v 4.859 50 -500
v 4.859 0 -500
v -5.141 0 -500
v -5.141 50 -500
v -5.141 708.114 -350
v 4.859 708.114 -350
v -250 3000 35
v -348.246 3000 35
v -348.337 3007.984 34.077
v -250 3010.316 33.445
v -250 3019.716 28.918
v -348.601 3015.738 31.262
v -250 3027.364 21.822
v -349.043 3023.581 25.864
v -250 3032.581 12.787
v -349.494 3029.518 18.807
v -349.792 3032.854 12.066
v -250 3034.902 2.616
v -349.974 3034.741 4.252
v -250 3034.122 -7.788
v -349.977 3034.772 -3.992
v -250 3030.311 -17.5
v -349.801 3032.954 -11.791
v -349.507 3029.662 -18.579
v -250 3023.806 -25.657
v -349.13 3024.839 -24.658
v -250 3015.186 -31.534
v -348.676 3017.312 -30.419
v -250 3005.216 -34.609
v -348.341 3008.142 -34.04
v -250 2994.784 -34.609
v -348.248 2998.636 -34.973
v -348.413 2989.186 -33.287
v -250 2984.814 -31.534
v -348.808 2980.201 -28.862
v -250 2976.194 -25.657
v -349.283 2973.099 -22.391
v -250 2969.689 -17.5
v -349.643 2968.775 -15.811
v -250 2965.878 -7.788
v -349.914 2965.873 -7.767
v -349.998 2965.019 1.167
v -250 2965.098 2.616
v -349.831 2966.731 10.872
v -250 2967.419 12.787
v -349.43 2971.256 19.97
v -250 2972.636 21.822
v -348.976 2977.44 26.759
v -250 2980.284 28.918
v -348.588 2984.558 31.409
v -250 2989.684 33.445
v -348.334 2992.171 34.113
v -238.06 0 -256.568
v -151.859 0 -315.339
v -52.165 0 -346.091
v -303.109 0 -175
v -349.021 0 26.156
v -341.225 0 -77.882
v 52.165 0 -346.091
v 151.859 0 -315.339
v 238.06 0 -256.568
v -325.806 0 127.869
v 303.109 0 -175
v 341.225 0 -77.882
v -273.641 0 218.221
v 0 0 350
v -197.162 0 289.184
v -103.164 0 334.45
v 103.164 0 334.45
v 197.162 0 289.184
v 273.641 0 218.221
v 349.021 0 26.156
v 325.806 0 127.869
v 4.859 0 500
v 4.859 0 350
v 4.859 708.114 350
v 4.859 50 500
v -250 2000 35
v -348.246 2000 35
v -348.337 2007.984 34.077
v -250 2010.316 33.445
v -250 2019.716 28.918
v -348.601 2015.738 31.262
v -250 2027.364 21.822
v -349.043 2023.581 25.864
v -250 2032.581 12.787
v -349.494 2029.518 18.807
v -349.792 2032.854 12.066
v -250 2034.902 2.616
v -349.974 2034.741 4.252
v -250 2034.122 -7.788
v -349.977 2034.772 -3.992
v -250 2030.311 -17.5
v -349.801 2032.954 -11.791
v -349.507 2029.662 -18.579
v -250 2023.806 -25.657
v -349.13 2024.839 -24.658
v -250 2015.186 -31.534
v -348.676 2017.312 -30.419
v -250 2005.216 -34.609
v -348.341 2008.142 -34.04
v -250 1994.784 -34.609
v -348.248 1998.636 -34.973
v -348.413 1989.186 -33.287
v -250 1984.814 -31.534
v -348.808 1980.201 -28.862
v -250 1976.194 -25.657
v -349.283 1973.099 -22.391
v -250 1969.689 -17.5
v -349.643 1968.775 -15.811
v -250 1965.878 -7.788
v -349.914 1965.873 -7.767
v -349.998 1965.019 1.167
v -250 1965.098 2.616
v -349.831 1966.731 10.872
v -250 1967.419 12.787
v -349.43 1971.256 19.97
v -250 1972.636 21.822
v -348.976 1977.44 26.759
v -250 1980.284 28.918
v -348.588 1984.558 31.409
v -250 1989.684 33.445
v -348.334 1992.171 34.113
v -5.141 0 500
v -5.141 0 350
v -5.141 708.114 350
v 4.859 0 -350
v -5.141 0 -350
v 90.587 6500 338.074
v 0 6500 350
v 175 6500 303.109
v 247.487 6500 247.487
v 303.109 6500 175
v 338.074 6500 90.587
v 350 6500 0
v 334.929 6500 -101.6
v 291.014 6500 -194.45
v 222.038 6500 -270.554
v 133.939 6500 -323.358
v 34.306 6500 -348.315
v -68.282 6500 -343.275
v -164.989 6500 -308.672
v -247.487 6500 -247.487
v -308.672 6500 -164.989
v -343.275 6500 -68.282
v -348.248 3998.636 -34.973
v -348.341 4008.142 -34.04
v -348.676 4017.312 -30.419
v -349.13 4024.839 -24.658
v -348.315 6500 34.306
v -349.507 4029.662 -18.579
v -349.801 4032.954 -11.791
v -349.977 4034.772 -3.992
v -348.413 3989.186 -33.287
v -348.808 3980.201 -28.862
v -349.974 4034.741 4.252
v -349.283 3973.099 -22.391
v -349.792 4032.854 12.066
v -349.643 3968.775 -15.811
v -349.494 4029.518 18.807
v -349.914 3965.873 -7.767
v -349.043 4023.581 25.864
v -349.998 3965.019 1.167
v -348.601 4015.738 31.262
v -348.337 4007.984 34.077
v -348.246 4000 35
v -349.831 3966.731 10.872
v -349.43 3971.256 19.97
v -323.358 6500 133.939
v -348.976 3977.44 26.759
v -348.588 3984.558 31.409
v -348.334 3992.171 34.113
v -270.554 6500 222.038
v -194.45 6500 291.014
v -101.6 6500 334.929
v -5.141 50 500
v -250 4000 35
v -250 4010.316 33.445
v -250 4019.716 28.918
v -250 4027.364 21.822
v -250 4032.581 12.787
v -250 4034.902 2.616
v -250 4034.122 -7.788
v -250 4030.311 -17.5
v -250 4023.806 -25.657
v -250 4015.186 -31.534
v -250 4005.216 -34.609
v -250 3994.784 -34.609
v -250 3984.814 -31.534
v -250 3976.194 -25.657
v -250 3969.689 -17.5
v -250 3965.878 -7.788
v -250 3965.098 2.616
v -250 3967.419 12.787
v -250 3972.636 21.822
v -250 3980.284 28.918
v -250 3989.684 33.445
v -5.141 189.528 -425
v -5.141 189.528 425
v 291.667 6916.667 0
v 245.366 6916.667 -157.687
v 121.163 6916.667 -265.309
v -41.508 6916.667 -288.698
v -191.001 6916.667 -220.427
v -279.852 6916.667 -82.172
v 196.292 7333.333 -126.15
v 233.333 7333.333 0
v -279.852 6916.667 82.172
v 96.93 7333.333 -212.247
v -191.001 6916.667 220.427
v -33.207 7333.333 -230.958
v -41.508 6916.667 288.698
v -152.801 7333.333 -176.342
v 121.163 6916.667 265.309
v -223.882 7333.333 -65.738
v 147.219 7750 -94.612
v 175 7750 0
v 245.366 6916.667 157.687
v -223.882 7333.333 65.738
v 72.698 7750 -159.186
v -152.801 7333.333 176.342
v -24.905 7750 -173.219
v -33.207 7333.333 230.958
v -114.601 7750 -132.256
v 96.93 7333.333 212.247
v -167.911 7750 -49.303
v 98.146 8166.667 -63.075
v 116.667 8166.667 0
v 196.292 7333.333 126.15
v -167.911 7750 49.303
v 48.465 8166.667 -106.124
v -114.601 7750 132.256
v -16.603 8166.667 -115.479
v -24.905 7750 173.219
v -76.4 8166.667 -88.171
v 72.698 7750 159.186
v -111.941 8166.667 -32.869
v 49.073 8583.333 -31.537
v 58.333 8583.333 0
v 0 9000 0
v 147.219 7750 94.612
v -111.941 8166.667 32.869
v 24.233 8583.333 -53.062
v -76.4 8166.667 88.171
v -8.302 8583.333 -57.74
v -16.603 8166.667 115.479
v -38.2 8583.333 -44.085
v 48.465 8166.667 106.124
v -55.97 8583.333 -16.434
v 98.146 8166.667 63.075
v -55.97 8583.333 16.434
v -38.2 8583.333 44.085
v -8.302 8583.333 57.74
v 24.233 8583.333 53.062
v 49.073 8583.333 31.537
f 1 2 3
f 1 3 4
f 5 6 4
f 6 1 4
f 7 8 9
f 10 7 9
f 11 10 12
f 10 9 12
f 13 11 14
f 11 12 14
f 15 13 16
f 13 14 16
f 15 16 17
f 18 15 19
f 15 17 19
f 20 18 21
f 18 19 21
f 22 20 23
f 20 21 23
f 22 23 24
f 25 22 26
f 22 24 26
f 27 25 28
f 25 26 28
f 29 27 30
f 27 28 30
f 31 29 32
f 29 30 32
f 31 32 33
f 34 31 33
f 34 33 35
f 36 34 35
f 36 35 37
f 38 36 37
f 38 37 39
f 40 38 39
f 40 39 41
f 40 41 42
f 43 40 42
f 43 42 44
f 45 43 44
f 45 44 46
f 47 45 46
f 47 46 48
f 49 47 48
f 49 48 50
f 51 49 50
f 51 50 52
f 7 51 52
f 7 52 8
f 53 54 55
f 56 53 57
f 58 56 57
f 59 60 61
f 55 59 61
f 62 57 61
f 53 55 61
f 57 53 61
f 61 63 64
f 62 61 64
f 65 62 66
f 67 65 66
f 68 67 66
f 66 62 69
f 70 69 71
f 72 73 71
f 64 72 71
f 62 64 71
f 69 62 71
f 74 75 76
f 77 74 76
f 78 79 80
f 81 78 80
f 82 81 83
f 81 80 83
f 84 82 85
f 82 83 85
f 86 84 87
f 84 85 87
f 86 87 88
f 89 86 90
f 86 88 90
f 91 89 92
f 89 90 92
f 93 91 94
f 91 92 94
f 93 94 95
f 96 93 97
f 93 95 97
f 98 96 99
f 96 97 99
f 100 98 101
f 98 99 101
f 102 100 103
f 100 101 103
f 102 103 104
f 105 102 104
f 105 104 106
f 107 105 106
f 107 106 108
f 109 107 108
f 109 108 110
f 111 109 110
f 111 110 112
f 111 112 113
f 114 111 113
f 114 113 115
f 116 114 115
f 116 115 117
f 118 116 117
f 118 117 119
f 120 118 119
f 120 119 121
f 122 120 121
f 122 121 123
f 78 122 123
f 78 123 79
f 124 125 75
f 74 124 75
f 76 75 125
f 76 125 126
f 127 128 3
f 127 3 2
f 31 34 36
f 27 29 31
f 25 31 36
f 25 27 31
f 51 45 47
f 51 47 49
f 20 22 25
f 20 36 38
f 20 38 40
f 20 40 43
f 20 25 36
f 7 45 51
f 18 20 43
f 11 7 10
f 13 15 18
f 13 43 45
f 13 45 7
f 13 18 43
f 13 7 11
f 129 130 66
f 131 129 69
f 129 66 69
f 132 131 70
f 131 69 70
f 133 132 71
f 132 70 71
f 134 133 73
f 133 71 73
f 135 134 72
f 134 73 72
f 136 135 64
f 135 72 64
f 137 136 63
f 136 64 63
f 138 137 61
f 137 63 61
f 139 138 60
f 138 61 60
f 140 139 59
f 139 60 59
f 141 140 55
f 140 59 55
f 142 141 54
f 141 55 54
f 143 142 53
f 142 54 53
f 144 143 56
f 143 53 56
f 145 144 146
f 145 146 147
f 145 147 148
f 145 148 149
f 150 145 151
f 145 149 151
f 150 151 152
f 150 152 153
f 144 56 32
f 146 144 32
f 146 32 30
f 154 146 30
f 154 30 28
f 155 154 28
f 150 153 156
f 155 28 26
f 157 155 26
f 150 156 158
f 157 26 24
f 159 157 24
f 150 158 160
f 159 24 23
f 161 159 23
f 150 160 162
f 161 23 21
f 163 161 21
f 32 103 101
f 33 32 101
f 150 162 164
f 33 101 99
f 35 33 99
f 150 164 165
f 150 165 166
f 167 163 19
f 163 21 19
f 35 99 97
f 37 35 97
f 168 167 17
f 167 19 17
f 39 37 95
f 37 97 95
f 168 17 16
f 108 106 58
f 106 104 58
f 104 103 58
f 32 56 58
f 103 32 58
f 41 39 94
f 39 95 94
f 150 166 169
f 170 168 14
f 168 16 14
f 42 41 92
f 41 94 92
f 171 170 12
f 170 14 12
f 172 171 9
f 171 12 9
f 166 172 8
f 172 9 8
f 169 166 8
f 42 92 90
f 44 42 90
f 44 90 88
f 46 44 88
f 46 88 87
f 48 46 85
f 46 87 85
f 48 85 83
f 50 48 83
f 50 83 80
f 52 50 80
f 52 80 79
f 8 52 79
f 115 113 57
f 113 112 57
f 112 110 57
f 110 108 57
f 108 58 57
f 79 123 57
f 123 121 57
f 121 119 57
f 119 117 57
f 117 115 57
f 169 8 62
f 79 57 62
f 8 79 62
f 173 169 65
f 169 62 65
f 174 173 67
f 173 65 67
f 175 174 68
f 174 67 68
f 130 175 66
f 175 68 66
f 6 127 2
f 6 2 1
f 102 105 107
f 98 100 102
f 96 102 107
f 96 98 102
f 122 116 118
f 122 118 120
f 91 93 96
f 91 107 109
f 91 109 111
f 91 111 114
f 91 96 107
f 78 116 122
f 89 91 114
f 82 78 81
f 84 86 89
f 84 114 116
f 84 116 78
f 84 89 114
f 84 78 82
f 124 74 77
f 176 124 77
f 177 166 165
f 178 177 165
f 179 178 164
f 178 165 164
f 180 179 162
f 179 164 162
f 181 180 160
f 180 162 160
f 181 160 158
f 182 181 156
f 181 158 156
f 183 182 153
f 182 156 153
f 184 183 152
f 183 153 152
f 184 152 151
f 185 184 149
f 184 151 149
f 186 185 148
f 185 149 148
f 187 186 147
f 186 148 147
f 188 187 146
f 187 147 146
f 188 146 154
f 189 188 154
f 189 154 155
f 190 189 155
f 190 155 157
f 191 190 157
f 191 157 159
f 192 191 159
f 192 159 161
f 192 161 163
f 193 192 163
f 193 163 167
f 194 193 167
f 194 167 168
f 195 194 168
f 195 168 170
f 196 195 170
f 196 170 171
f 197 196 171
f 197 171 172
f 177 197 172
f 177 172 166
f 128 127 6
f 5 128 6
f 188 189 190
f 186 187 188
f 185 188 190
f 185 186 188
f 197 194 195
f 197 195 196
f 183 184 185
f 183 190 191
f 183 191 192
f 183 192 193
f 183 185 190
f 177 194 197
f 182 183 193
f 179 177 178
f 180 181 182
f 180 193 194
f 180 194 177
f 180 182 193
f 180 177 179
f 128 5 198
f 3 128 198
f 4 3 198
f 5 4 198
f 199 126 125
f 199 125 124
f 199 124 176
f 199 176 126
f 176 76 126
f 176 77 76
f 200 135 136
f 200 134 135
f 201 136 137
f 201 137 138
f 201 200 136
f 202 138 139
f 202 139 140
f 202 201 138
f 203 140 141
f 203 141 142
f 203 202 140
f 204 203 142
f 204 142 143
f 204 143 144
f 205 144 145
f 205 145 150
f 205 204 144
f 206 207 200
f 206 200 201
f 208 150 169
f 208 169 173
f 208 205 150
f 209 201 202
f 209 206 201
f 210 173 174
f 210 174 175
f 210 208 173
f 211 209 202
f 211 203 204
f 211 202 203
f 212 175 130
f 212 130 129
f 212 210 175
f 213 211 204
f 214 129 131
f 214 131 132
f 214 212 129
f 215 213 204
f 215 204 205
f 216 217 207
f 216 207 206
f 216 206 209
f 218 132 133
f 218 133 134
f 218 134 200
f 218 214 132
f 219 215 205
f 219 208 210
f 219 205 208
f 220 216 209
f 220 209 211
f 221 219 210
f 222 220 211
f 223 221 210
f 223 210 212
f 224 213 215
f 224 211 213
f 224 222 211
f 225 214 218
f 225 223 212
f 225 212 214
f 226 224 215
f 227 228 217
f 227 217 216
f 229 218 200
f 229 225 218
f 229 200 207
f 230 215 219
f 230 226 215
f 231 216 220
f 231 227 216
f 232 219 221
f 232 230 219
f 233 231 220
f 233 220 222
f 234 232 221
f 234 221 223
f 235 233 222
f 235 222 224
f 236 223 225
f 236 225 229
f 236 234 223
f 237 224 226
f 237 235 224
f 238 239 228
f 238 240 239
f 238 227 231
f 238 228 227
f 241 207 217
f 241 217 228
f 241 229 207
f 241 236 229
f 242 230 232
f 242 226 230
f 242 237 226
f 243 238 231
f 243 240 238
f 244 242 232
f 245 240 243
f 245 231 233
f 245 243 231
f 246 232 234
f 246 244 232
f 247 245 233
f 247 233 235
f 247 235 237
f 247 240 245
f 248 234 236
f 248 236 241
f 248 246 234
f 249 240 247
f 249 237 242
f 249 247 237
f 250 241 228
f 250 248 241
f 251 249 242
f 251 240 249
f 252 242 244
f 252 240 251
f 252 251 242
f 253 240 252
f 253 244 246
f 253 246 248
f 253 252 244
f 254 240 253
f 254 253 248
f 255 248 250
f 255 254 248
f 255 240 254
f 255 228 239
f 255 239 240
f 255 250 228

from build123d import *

# Parameters (mm, degrees)
SKETCH1_R           = 350
BOSS_EXTRUDE1_DEPTH = 6500
SKETCH10_R          = 35
CUT_EXTRUDE2_DEPTH  = 100
LPATTERN1_COUNT     = 3
LPATTERN1_PITCH     = 1000


# Read off the part's stored shape, not the designer's step: Loft3
with BuildPart() as part:
    # Sketch1 → Boss-Extrude1 (new body)
    with BuildSketch(Plane(origin=(0, 0, 0), x_dir=(1, 0, 0), z_dir=(0, 1, 0))):
        with Locations(Location((0, 0, 0), (0, 0, 270))):
            Circle(SKETCH1_R)
    extrude(amount=BOSS_EXTRUDE1_DEPTH)

    # Sketch10 → Cut-Extrude2 (cut)
    with BuildSketch(Plane.ZY.offset(350)):
        with Locations((0, 2000)):
            Circle(SKETCH10_R)
    cut_extrude2 = extrude(amount=-CUT_EXTRUDE2_DEPTH, mode=Mode.SUBTRACT)

    # LPattern1: Cut-Extrude2 ×3
    with Locations(*[(0, i * LPATTERN1_PITCH, 0) for i in range(1, LPATTERN1_COUNT)]):
        add(cut_extrude2, mode=Mode.SUBTRACT)

    # Loft3 outline → Loft3 (revolve)
    with BuildSketch(Plane.XY):
        Polygon((350, 6500), (0, 9000), (0, 6500), align=None)
    revolve(axis=Axis((0, 0, 0), (0, 1, 0)))


with BuildPart() as body_2:
    # Sketch6 → Loft2 section 0
    with BuildSketch(Plane(origin=(0, 0, -350), x_dir=(-1, 0, 0), z_dir=(0, 0, -1))):
        with BuildLine():
            Line((-4.859485667, 0), (-4.859485667, 708.11375157))
            Line((-4.859485667, 708.11375157), (5.140514333, 708.11375157))
            Line((5.140514333, 708.11375157), (5.140514333, 0))
            Line((5.140514333, 0), (-4.859485667, 0))
        make_face()
    # Sketch7 → Loft2 section 1
    with BuildSketch(Plane(origin=(0, 0, -500), x_dir=(-1, 0, 0), z_dir=(0, 0, -1))):
        with BuildLine():
            Line((-4.859485667, 0), (-4.859485667, 50))
            Line((-4.859485667, 50), (5.140514333, 50))
            Line((5.140514333, 50), (5.140514333, 0))
            Line((5.140514333, 0), (-4.859485667, 0))
        make_face()
    loft()


with BuildPart() as body_3:
    # Mirror1: mirrored copy
    add(body_2.part.mirror(Plane.XY))


solid = Compound([part.part, body_2.part, body_3.part])
